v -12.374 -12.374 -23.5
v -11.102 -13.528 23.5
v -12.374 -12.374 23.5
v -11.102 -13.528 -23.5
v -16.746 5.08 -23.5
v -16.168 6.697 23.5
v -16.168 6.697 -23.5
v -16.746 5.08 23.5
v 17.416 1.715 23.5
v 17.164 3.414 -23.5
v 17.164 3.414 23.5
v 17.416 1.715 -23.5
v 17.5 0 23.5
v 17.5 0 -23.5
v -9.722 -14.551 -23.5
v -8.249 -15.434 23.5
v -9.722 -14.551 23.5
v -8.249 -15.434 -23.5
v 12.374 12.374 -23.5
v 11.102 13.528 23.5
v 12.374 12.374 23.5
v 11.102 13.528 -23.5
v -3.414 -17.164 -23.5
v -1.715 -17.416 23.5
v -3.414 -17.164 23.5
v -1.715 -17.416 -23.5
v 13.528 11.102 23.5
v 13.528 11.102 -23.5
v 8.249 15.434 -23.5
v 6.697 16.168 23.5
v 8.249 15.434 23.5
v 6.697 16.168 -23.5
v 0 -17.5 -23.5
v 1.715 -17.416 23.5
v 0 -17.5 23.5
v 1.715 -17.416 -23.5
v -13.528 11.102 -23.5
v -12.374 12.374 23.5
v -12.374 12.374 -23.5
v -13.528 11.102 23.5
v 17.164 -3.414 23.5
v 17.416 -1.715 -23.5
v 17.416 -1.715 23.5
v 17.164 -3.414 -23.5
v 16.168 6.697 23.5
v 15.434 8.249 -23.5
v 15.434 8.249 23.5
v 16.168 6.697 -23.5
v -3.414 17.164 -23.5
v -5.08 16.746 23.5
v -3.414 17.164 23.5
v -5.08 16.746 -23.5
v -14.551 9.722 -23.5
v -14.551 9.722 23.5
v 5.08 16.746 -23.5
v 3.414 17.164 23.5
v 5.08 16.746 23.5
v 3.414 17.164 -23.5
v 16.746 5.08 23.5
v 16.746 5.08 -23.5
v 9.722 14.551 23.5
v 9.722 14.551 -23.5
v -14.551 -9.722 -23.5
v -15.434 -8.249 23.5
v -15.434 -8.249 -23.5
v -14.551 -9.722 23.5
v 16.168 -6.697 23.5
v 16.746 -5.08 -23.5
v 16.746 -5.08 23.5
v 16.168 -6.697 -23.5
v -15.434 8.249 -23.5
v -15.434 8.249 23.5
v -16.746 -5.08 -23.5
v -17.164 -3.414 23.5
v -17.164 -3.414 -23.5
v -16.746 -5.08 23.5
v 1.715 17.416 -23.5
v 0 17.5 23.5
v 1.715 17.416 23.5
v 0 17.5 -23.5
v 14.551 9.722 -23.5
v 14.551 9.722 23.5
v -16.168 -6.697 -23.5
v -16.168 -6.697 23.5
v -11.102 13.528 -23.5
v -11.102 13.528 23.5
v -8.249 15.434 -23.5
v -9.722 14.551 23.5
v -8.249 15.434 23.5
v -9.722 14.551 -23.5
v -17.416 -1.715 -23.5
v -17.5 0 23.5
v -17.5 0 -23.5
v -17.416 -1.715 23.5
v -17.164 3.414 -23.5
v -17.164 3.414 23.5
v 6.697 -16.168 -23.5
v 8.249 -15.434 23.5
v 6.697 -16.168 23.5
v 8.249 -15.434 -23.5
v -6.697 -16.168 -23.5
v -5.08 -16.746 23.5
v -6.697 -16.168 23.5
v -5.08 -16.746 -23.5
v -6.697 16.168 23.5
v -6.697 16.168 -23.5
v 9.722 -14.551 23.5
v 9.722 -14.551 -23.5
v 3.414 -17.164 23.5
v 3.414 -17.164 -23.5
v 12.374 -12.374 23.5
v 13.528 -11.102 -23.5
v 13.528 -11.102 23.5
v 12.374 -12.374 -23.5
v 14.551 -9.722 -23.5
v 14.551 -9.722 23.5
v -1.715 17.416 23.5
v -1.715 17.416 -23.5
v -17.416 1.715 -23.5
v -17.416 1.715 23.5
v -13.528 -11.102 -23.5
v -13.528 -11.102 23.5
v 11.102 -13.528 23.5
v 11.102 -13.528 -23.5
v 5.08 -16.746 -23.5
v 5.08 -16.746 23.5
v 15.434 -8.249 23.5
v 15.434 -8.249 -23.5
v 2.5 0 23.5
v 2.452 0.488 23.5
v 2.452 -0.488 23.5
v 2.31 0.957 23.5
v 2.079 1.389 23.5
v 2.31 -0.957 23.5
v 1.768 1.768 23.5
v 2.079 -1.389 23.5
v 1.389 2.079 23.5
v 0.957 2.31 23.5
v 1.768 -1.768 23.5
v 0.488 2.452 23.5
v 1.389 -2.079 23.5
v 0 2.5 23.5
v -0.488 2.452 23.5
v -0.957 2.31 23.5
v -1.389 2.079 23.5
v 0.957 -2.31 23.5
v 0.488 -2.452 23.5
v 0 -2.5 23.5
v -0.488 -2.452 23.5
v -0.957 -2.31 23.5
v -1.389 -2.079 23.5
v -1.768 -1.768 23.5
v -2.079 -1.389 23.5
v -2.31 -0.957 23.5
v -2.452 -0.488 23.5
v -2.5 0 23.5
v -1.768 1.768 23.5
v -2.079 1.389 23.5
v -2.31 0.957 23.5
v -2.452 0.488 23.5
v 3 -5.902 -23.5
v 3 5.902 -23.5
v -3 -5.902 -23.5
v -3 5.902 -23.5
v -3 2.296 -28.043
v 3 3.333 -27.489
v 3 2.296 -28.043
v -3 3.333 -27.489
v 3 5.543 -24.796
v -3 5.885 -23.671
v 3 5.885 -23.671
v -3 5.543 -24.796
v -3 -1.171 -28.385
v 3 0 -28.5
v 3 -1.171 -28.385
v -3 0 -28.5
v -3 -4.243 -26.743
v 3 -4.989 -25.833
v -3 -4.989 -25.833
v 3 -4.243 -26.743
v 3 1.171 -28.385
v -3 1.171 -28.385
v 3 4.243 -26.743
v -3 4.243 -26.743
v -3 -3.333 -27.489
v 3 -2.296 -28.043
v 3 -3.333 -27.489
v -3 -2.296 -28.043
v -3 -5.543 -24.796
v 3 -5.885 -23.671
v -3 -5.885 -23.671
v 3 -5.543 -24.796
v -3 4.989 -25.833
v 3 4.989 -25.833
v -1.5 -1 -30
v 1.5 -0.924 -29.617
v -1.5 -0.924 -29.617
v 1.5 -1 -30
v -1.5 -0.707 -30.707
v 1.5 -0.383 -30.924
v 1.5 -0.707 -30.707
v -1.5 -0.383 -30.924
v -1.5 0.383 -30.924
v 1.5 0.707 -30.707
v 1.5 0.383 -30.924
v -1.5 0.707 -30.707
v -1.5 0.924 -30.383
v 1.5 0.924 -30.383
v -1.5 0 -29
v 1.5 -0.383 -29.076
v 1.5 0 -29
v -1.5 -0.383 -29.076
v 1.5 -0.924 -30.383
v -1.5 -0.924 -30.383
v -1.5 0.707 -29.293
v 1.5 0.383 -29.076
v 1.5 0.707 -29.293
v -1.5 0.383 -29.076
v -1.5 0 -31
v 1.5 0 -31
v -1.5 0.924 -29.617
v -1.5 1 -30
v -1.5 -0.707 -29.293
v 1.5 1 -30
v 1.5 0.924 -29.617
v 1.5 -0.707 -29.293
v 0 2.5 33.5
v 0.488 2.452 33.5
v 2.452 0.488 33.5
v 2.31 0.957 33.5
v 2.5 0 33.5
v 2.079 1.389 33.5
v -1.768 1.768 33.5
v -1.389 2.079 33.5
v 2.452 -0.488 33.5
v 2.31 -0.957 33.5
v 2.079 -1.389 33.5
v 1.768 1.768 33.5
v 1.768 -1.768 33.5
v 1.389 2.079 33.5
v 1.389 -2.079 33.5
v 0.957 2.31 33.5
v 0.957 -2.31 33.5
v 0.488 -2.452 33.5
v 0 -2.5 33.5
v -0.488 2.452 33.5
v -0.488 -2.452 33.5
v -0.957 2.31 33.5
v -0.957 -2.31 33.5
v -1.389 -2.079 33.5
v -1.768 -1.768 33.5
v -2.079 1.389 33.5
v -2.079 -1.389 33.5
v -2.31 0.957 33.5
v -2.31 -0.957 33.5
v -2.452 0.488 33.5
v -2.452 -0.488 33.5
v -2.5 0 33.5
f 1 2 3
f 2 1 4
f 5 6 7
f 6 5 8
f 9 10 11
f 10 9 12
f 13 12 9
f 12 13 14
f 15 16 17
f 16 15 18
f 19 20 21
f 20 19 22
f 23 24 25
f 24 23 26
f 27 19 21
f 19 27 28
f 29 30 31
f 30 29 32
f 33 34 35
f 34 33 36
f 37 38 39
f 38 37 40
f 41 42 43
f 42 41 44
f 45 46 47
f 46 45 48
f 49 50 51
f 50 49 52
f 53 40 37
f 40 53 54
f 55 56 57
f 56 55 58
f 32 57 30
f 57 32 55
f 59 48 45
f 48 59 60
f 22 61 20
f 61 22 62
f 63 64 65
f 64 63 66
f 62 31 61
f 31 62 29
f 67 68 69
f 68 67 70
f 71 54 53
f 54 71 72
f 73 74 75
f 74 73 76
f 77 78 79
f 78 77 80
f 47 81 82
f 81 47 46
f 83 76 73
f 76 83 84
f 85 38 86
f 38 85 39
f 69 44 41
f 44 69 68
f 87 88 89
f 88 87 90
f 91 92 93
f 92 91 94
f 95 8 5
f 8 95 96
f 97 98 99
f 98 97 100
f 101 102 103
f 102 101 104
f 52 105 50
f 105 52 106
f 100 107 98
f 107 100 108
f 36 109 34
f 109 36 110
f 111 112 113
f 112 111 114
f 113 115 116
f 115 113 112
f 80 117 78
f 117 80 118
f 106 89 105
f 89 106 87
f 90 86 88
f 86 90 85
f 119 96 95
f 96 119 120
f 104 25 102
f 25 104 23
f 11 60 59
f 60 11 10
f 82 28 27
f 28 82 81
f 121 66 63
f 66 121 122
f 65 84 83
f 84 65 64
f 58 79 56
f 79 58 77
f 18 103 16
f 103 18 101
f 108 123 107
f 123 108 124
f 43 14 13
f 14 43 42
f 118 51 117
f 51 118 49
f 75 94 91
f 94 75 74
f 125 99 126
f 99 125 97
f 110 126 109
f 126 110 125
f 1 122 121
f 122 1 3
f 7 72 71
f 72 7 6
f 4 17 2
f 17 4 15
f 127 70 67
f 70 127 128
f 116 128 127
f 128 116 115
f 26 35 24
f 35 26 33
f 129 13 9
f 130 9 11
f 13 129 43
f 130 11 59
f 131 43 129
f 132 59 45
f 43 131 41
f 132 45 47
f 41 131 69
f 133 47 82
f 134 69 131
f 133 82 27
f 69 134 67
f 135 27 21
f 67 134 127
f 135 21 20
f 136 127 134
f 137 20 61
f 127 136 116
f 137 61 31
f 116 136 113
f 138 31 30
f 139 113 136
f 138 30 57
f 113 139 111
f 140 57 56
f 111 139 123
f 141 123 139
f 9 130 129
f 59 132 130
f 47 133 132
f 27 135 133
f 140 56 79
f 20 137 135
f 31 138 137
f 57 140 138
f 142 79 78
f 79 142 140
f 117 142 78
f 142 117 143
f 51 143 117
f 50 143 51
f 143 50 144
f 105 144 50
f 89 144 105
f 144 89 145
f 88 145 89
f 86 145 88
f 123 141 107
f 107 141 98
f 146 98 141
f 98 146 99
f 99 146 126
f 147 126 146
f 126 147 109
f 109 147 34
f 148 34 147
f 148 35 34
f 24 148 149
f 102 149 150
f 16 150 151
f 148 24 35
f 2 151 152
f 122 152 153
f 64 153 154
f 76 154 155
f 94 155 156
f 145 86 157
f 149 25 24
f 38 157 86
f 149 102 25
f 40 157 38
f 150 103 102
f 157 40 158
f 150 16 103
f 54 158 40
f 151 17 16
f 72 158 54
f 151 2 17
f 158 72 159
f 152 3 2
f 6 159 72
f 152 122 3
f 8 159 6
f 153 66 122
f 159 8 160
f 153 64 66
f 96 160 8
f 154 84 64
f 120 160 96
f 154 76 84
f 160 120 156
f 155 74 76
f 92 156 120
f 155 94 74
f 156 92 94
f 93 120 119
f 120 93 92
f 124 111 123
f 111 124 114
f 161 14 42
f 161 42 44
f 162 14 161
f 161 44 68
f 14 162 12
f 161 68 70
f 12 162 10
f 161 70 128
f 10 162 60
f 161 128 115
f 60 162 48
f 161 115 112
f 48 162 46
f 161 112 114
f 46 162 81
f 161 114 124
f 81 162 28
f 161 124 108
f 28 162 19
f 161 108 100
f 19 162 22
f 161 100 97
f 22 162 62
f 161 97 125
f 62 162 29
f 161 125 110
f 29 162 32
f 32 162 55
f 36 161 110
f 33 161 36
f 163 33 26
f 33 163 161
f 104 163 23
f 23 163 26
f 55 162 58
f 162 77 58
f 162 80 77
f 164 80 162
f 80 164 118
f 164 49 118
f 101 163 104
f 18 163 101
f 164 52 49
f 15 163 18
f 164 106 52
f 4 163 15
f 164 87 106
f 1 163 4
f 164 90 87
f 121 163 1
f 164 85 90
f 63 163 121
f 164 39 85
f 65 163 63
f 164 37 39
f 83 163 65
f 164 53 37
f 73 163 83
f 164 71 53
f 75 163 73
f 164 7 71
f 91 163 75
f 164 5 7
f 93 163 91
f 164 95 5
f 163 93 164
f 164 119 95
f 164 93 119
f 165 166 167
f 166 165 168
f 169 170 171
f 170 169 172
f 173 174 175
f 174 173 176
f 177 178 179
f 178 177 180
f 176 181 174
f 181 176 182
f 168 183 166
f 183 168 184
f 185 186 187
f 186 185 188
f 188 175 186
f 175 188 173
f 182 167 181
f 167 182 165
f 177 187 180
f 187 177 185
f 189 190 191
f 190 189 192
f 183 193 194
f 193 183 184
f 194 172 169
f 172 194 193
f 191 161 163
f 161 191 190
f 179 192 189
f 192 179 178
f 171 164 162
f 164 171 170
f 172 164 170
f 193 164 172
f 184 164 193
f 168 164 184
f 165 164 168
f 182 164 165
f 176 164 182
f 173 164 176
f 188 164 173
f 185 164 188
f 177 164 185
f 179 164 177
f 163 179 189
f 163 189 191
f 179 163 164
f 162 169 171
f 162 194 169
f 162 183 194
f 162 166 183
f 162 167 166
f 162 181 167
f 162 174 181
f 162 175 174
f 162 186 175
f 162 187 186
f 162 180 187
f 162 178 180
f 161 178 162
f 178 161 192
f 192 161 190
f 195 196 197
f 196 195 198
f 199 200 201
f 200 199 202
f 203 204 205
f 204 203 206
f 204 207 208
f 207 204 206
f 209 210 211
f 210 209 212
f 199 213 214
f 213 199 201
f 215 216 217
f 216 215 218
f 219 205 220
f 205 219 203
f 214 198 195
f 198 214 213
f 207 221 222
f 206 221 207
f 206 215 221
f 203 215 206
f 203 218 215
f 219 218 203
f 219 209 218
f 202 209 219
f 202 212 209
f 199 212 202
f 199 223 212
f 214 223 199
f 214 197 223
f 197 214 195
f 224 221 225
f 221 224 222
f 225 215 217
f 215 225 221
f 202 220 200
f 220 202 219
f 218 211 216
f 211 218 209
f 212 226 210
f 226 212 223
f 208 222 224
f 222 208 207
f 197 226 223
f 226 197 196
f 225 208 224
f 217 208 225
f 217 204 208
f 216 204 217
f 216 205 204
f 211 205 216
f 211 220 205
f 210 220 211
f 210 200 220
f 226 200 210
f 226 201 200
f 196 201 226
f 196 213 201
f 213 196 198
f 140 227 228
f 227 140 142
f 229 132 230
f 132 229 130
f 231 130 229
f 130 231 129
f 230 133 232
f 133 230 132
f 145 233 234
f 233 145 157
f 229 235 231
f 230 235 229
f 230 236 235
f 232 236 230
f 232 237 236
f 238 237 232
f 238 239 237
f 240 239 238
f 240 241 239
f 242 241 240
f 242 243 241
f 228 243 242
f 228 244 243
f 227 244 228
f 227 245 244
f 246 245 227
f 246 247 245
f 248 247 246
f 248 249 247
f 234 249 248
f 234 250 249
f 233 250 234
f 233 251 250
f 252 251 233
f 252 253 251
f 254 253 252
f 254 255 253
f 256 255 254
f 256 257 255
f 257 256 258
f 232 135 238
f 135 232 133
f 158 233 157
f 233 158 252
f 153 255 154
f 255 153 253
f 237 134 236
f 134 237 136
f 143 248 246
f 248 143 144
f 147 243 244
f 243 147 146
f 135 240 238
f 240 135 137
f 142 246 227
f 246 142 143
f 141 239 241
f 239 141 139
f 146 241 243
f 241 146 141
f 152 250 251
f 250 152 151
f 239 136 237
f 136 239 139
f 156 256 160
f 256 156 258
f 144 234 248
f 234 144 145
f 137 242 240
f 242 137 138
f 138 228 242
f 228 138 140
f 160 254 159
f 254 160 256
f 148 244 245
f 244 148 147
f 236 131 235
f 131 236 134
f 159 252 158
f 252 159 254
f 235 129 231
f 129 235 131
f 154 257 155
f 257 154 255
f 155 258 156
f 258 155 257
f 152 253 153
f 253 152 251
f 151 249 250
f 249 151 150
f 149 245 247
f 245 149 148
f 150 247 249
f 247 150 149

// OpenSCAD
// Parameters
stator_diameter_mm = 35.0; //[17.5:70.0:0.5]
motor_height_mm = 45.0; //[22.5:90.0:0.5]
housing_outer_diameter_mm = 35.0; //[17.5:70.0:0.5]
shaft_diameter_mm = 5.0; //[2.5:10.0:0.1]
shaft_extension_mm = 10.0; //[5.0:20.0:0.5]
endcap_thickness_mm = 2.0; //[1.0:4.0:0.1]
overlap_mm = 1.0; //[0.5:2.0:0.1]
buzzer_diameter_mm = 12.0; //[6.0:24.0:0.5]
buzzer_height_mm = 6.0; //[3.0:12.0:0.5]
buzzer_pin_diameter_mm = 2.0; //[1.0:4.0:0.1]
buzzer_pin_height_mm = 3.0; //[1.5:6.0:0.5]

// Buzzer module with detailed geometry
module buzzer() {
  color([0.2, 0.2, 0.2]) {
    // Buzzer body
    rotate([0, 90, 0])
      translate([housing_outer_diameter_mm/2 + buzzer_diameter_mm/2 - overlap_mm, 0, 0])
      cylinder(r=buzzer_diameter_mm/2, h=buzzer_height_mm, center=true, $fn=32);
    
    // Buzzer pin
    rotate([0, 90, 0])
      translate([housing_outer_diameter_mm/2 + buzzer_diameter_mm + buzzer_pin_height_mm/2 - overlap_mm, 0, 0])
      cylinder(r=buzzer_pin_diameter_mm/2, h=buzzer_pin_height_mm, center=true, $fn=16);
  }
}

// Motor assembly
module assembly() {
  // Motor housing
  color("Black") {
    translate([0, 0, 0])
      cylinder(r=housing_outer_diameter_mm/2, h=motor_height_mm, center=true, $fn=64);
  }
  
  // Endcaps
  color("DimGray") {
    translate([0, 0, motor_height_mm/2 + endcap_thickness_mm/2 - overlap_mm])
      cylinder(r=housing_outer_diameter_mm/2, h=endcap_thickness_mm, center=true, $fn=64);
    translate([0, 0, -motor_height_mm/2 - endcap_thickness_mm/2 + overlap_mm])
      cylinder(r=housing_outer_diameter_mm/2, h=endcap_thickness_mm, center=true, $fn=64);
  }
  
  // Shaft
  color("Silver") {
    translate([0, 0, motor_height_mm/2 + endcap_thickness_mm - overlap_mm + shaft_extension_mm/2])
      cylinder(r=shaft_diameter_mm/2, h=shaft_extension_mm, center=true, $fn=32);
  }
  
  // Buzzer
  buzzer();
}

// Final assembly call
assembly();
